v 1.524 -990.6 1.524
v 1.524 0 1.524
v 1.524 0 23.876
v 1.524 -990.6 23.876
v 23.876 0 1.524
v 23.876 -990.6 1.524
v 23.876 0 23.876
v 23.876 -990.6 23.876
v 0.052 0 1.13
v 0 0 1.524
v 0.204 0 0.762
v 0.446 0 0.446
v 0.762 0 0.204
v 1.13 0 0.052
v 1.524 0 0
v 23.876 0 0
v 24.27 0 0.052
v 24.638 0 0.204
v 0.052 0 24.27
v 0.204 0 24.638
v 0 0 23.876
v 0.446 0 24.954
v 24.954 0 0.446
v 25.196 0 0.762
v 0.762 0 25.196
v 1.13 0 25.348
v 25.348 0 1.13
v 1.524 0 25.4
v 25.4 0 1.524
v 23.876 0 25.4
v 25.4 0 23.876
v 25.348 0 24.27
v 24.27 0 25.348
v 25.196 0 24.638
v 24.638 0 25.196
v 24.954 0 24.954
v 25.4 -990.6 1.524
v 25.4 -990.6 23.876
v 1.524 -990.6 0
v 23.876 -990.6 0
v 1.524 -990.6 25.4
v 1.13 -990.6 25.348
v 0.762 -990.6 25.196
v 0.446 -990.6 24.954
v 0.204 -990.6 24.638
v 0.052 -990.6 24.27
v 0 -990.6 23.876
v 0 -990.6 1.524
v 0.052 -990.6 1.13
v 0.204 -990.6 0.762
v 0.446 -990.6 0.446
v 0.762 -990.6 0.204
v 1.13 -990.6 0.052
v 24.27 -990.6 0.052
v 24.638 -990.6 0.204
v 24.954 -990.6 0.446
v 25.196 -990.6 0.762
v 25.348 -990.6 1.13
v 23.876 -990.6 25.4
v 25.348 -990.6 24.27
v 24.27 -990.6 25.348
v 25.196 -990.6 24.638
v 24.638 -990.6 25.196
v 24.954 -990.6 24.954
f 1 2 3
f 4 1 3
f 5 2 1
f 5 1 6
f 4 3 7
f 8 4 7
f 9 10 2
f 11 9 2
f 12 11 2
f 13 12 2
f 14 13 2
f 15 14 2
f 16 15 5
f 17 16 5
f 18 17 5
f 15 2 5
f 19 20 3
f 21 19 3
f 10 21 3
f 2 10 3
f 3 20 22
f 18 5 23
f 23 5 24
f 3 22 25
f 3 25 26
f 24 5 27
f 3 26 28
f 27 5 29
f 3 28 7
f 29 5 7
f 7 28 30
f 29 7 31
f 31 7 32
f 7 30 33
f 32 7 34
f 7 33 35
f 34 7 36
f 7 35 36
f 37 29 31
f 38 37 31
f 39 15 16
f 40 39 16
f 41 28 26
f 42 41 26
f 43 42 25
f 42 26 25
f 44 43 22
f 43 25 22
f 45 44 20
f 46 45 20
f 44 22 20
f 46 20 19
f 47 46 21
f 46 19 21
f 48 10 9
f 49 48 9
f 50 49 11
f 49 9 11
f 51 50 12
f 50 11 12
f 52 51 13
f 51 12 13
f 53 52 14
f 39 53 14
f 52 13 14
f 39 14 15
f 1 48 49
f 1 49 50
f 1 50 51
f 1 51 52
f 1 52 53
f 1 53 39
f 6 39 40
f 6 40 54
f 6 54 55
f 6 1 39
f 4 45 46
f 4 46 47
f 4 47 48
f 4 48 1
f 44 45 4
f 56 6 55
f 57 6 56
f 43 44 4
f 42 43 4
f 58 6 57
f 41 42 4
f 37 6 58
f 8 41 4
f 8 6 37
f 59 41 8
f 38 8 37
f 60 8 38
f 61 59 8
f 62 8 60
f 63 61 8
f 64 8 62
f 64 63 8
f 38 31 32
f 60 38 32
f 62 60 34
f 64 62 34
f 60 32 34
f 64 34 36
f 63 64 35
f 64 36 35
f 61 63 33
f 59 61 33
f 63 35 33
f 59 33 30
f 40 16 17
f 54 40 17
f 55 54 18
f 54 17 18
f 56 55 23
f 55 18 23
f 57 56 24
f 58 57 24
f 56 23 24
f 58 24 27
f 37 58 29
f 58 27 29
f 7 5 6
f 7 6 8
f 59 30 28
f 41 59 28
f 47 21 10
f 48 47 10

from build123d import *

# Parameters (mm, degrees)
F0_W     = 22.352
F0_H     = 22.352
F1_DEPTH = 990.6


with BuildPart() as f1:
    # F0 (on Front) → F1 (new body)
    with BuildSketch(Plane.XZ):
        with BuildLine():
            ThreePointArc((0, 1.524), (0.446369, 0.446369), (1.524, 0))
            Line((1.524, 0), (23.876, 0))
            ThreePointArc((23.876, 0), (24.953631, 0.446369), (25.4, 1.524))
            Line((25.4, 1.524), (25.4, 23.876))
            ThreePointArc((25.4, 23.876), (24.953631, 24.953631), (23.876, 25.4))
            Line((23.876, 25.4), (1.524, 25.4))
            ThreePointArc((1.524, 25.4), (0.446369, 24.953631), (0, 23.876))
            Line((0, 23.876), (0, 1.524))
        make_face()
        with Locations((12.7, 12.7)):
            Rectangle(F0_W, F0_H, mode=Mode.SUBTRACT)
    extrude(amount=F1_DEPTH)


solid = f1.part
